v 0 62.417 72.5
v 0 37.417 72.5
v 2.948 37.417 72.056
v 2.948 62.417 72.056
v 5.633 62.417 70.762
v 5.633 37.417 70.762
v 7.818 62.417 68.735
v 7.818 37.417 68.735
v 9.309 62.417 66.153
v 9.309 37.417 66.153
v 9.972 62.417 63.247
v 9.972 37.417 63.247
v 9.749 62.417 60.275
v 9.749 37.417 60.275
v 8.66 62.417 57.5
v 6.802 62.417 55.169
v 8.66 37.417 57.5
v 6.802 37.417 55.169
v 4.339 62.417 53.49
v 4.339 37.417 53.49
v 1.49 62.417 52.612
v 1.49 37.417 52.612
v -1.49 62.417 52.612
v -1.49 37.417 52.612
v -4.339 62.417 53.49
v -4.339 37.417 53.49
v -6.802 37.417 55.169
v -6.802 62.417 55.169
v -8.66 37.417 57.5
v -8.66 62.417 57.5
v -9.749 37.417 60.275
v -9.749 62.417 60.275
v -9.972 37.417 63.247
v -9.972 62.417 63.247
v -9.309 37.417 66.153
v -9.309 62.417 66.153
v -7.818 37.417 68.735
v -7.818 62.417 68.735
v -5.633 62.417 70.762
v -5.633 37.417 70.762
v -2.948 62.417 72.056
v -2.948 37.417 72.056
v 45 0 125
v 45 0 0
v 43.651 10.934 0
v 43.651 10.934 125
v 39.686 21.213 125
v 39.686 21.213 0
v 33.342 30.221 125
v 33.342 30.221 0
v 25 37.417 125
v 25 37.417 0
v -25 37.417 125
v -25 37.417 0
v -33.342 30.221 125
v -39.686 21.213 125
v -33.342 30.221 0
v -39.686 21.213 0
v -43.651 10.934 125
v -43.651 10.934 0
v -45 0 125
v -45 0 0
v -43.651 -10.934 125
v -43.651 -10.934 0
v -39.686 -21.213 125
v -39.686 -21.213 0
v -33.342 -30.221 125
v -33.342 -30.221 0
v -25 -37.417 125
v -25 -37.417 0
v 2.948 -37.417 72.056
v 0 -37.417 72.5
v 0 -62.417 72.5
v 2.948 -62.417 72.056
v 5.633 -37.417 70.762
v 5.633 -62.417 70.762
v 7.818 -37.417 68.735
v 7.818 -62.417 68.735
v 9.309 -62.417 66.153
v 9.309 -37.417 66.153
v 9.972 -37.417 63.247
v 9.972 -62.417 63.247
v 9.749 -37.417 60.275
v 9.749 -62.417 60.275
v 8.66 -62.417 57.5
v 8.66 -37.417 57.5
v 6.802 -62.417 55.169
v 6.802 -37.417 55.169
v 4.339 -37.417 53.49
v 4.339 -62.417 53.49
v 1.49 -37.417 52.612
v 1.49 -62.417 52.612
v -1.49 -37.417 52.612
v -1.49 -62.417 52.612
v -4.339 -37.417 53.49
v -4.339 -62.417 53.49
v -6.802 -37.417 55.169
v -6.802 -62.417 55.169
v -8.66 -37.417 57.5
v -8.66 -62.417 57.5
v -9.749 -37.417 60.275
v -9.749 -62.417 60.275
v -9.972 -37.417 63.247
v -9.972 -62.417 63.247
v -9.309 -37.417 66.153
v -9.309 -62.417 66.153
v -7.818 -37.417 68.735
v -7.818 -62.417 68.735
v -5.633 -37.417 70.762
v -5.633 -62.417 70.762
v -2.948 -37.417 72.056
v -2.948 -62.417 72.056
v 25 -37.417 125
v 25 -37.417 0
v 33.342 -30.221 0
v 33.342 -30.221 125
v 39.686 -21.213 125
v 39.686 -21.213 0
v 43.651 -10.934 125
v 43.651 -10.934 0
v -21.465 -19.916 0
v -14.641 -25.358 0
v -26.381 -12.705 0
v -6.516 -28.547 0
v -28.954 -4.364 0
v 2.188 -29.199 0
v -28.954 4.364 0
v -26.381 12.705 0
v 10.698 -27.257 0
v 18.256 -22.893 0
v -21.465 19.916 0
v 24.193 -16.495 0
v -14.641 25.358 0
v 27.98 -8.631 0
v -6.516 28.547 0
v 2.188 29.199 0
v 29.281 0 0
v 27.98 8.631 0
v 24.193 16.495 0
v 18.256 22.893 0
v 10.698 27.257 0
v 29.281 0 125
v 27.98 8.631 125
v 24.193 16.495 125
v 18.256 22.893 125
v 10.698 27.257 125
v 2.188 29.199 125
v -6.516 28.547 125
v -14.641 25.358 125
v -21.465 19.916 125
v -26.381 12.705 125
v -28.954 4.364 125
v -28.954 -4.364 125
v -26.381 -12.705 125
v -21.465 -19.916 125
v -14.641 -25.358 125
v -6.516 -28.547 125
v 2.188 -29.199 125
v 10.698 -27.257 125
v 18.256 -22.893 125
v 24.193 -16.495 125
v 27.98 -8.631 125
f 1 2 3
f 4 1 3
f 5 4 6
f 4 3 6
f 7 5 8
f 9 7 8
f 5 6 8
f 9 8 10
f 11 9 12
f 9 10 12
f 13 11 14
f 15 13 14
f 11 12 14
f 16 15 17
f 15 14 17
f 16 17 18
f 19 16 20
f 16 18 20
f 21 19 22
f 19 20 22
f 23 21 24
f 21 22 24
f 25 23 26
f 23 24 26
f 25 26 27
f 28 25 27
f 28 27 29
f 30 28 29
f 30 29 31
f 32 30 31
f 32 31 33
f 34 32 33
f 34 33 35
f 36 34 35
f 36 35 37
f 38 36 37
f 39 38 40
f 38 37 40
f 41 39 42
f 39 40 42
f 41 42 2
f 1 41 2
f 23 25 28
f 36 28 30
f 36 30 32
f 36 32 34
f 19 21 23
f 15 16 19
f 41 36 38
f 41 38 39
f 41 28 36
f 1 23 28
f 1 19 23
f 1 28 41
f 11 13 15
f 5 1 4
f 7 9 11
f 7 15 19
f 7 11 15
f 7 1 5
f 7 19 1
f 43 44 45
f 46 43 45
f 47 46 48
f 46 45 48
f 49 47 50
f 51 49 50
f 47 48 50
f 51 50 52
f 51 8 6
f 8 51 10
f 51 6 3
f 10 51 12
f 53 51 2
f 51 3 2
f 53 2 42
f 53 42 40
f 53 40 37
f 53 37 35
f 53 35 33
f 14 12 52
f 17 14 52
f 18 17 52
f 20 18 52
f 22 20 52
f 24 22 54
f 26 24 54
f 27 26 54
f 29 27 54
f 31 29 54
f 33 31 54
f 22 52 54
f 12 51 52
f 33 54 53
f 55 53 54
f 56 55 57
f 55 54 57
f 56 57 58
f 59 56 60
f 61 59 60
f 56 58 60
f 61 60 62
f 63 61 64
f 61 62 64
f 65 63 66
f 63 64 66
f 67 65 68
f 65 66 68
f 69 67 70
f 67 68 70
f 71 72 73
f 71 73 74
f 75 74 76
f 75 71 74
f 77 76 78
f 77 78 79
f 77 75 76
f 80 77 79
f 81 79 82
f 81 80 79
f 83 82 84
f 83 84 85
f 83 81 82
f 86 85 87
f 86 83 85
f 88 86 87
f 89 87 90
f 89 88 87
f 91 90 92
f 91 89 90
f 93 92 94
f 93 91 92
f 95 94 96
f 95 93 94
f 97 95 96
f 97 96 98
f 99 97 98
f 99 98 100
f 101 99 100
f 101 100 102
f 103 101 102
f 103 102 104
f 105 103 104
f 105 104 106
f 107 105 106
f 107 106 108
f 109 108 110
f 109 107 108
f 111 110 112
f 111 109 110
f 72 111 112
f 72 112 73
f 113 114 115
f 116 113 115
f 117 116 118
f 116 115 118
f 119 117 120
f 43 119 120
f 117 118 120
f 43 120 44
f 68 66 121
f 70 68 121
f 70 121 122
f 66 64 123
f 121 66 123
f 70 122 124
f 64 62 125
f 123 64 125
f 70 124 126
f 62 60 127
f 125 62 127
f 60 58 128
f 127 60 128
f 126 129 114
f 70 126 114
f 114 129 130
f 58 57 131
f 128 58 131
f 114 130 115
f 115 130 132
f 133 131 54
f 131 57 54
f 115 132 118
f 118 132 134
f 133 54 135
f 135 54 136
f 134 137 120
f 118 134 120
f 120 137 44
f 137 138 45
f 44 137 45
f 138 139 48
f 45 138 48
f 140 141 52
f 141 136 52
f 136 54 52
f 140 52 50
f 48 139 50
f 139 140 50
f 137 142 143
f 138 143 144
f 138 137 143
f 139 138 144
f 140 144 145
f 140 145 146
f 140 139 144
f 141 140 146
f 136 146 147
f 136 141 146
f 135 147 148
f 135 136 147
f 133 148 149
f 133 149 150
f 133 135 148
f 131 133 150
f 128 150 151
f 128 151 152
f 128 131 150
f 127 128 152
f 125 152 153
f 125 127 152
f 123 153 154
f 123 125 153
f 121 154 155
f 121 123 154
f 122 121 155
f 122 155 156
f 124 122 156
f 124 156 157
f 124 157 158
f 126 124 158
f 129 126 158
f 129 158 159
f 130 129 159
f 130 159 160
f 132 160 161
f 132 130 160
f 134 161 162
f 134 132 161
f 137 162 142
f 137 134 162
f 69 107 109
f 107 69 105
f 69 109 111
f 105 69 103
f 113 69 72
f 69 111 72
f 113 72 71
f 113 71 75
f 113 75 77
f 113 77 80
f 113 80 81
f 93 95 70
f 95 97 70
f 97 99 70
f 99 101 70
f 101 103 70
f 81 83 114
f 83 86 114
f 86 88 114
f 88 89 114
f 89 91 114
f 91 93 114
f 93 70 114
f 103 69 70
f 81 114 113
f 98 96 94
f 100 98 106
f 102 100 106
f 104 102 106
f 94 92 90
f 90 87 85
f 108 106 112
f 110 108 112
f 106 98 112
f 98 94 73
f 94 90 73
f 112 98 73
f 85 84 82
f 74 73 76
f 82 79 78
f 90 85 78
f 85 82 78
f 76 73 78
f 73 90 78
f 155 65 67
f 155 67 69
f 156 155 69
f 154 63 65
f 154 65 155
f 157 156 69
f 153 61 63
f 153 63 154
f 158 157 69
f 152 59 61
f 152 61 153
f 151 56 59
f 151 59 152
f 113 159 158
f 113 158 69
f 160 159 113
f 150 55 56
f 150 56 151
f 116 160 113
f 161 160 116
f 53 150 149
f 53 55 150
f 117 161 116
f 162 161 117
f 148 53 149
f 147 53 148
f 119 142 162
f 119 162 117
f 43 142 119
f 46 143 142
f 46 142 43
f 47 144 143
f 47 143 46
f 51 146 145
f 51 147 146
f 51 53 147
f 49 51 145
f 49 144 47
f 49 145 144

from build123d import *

# Parameters (mm, degrees)
ESQUISSE1_R        = 29.281018542
BOSS_EXTRU_1_DEPTH = 125
ESQUISSE2_R        = 10
BOSS_EXTRU_2_DEPTH = 25


with BuildPart() as part:
    # Esquisse1 → Boss.-Extru.1 (new body)
    with BuildSketch(Plane.XY):
        with BuildLine():
            Line((25, 37.416573868), (-25, 37.416573868))
            ThreePointArc((-25, 37.416573868), (-45, 0), (-25, -37.416573868))
            Line((-25, -37.416573868), (25, -37.416573868))
            ThreePointArc((25, -37.416573868), (39.686269666, -21.213203436), (45, 0))
            ThreePointArc((45, 0), (39.686269666, 21.213203436), (25, 37.416573868))
        make_face()
        Circle(ESQUISSE1_R, mode=Mode.SUBTRACT)
    extrude(amount=BOSS_EXTRU_1_DEPTH)

    # Esquisse2 → Boss.-Extru.2 (add)
    with BuildSketch(Plane(origin=(0, 37.416573868, 0), x_dir=(1, 0, 0), z_dir=(0, 1, 0))):
        with Locations(Location((0, -62.5, 0), (0, 0, 270))):
            Circle(ESQUISSE2_R)
    boss_extru_2 = extrude(amount=BOSS_EXTRU_2_DEPTH)

    # Symétrie1: Boss.-Extru.2 across plane
    add(boss_extru_2.mirror(Plane.ZX))


solid = part.part
